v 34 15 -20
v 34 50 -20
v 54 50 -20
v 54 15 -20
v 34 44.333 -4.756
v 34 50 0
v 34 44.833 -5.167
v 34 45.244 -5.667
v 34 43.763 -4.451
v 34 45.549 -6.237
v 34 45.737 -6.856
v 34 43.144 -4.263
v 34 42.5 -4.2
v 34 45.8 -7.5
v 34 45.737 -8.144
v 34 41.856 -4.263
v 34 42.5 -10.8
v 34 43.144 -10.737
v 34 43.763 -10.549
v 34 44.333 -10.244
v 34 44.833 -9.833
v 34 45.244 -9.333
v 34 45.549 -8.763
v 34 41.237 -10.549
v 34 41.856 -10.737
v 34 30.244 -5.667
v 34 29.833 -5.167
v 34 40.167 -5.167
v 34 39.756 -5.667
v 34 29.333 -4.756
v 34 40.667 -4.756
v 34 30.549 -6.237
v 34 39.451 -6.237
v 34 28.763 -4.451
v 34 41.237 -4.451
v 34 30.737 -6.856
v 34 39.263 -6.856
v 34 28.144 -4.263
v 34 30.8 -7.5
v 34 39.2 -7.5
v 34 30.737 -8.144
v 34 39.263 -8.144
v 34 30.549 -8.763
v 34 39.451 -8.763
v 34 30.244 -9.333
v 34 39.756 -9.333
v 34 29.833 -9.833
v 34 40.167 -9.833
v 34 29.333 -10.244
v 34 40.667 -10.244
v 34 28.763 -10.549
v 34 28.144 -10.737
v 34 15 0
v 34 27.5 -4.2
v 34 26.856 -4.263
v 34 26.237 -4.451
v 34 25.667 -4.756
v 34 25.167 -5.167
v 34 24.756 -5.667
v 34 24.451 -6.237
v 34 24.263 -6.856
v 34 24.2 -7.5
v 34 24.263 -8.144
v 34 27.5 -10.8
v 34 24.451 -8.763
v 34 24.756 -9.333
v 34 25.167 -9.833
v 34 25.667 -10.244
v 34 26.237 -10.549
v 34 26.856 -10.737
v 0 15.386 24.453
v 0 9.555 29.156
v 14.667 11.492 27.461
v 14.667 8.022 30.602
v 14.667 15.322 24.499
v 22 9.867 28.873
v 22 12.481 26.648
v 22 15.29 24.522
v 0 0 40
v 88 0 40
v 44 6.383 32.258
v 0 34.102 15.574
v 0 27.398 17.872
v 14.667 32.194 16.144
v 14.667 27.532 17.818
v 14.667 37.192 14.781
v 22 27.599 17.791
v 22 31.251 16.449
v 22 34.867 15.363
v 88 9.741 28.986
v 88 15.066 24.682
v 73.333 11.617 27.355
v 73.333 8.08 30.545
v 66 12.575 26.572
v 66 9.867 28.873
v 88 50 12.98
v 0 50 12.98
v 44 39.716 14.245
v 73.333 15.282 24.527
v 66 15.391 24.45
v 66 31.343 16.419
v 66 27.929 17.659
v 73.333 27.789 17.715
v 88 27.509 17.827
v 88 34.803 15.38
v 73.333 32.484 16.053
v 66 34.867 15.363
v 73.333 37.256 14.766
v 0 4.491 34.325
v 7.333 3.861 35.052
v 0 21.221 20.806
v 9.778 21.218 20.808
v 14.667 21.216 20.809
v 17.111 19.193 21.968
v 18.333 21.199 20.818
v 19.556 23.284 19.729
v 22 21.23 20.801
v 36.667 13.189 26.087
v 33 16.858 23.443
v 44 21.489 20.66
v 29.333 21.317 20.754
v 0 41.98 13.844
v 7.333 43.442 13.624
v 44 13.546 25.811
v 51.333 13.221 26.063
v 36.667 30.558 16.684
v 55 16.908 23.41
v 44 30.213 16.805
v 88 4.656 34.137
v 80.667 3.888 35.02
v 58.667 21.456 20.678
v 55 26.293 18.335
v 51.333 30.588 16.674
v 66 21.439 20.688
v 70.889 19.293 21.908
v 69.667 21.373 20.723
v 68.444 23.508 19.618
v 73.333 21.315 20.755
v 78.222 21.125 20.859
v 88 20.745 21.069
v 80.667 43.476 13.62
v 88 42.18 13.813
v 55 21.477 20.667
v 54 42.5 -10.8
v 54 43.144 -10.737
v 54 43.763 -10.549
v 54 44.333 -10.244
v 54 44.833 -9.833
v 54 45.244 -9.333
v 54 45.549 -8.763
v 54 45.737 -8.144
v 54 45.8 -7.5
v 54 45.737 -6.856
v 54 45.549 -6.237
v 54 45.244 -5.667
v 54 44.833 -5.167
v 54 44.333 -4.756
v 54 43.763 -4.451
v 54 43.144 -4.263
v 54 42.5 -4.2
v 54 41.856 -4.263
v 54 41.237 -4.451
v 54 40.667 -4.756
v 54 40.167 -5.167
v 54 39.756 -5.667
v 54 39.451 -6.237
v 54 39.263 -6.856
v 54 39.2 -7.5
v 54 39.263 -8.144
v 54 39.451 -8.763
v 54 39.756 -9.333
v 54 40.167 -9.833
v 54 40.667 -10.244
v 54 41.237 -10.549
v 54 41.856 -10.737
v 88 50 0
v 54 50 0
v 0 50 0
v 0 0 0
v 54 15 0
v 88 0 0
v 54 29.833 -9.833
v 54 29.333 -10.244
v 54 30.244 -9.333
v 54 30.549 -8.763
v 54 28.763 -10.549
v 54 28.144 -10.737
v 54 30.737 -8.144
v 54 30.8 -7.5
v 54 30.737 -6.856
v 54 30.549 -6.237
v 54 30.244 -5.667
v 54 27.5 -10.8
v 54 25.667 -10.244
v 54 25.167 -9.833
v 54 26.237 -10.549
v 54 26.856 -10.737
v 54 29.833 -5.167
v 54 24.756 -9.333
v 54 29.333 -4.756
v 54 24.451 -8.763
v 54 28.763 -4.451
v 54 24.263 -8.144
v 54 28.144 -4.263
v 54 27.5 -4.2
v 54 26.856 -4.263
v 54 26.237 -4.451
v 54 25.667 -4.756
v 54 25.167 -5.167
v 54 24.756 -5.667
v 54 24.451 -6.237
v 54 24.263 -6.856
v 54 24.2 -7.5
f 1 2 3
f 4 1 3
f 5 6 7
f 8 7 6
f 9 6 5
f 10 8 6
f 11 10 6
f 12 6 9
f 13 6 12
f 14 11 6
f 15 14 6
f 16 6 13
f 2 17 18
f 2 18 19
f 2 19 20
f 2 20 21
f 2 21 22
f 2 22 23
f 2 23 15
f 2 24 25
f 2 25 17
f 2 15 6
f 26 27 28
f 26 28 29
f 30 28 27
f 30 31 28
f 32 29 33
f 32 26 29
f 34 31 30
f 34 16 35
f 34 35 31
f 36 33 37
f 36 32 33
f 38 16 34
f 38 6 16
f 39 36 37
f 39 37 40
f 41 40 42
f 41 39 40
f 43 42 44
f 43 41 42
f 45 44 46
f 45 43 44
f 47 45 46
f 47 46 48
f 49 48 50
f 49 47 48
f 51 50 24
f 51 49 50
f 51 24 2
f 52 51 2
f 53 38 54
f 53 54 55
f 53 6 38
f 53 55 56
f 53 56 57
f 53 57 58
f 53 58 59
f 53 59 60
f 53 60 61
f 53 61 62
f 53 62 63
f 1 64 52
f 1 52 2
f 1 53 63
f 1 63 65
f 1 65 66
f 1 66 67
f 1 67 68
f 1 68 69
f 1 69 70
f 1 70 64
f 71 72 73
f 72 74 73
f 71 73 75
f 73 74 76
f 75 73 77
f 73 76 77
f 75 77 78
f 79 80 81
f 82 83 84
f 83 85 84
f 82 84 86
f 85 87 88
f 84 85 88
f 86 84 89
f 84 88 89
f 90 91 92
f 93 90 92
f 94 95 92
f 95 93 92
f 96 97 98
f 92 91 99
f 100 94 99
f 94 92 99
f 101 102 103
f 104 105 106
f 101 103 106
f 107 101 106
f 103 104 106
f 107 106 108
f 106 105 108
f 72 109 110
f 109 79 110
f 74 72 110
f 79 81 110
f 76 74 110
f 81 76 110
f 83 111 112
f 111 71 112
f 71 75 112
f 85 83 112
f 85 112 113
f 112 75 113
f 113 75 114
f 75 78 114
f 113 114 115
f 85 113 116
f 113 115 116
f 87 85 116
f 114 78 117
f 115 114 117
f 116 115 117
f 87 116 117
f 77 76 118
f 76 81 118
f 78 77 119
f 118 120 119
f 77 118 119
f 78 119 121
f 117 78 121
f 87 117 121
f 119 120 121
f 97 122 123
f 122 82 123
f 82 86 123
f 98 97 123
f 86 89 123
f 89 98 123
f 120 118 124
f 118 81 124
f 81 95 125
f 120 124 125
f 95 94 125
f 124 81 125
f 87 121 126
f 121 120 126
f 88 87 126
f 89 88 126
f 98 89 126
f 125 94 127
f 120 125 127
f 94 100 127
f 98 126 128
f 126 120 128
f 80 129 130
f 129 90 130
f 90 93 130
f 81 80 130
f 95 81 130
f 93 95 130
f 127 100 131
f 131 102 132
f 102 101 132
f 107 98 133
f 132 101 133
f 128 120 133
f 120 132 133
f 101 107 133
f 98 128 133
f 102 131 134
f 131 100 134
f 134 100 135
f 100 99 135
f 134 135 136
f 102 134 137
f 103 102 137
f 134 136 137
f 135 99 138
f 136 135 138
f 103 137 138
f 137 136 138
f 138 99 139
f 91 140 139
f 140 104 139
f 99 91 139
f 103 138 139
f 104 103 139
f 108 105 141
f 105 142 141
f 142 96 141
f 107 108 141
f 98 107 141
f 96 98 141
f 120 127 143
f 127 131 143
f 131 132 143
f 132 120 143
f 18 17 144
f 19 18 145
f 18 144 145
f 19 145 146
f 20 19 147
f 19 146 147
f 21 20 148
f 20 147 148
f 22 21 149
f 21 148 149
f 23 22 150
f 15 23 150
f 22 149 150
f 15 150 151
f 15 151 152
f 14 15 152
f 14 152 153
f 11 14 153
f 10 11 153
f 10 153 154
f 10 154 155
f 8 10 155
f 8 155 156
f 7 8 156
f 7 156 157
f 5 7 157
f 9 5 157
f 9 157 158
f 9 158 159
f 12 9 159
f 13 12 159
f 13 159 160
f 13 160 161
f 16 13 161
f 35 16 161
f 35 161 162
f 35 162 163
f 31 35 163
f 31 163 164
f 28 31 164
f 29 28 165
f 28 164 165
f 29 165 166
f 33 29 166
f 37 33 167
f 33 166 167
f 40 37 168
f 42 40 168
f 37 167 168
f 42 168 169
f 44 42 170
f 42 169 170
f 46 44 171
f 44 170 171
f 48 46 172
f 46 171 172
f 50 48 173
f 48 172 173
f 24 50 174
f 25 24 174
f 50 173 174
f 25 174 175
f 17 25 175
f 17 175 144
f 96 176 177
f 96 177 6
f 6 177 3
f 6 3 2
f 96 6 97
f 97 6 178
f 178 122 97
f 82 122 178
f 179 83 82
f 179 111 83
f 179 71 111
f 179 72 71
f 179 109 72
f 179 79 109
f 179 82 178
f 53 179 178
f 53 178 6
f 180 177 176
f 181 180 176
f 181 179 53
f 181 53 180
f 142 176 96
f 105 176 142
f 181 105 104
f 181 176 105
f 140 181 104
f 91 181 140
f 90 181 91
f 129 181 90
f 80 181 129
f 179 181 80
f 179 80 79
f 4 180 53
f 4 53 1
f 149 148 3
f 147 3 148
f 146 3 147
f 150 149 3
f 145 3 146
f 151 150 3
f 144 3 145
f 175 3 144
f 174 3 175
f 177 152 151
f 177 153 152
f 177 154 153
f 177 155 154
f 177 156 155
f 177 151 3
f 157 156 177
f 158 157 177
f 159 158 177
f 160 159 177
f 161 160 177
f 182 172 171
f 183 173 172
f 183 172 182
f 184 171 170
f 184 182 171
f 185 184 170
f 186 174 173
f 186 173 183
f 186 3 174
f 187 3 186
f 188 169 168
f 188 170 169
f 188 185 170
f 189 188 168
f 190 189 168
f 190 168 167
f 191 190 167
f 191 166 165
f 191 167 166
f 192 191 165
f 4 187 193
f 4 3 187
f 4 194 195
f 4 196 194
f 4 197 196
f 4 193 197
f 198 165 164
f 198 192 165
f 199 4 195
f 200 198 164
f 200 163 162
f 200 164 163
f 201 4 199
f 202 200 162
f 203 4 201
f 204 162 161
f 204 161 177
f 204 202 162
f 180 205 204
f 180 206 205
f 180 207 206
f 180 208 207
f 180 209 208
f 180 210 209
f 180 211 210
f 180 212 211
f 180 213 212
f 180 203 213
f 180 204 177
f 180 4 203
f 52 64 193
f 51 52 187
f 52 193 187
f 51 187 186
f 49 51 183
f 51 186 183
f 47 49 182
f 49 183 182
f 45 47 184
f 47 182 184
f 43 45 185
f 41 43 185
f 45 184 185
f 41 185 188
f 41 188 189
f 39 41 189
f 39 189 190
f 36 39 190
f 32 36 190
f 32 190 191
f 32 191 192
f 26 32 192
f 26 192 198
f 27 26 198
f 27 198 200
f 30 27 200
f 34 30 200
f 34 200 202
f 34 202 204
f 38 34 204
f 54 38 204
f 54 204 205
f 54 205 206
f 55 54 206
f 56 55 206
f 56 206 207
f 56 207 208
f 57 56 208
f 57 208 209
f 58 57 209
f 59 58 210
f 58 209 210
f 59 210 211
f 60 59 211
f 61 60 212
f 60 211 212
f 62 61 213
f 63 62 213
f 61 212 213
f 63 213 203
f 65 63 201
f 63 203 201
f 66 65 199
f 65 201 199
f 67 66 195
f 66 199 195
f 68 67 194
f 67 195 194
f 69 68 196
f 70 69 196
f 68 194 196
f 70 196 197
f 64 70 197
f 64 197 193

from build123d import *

# Parameters (mm, degrees)
BOSS_EXTRUDE1_DEPTH = 50
SKETCH2_W           = 20
SKETCH2_H           = 15
CUT_EXTRUDE1_DEPTH  = 40
CUT_EXTRUDE2_DEPTH  = 134
CUT_EXTRUDE3_REACH  = 85.762
SKETCH5_R           = 3.3


with BuildPart() as part:
    # Sketch1 → Boss-Extrude1 (new body)
    with BuildSketch(Plane(origin=(0, 0, 0), x_dir=(1, 0, 0), z_dir=(0, 1, 0))):
        Polygon((0, 0), (34, 0), (34, 20), (54, 20), (54, 0), (88, 0), (88, -40), (0, -40), align=None)
    extrude(amount=BOSS_EXTRUDE1_DEPTH)

    # Sketch2 → Cut-Extrude1 (cut)
    with BuildSketch(Plane(origin=(54, 0, 0), x_dir=(0, 0, -1), z_dir=(1, 0, 0))):
        with Locations((10, 7.5)):
            Rectangle(SKETCH2_W, SKETCH2_H)
    extrude(amount=-CUT_EXTRUDE1_DEPTH, mode=Mode.SUBTRACT)

    # Sketch3 → Cut-Extrude2 (cut)
    with BuildSketch(Plane(origin=(88, 0, 0), x_dir=(0, 0, -1), z_dir=(1, 0, 0))):
        with BuildLine():
            Line((-40, 0), (-40, 50))
            Line((-40, 50), (-12.980453639, 50))
            add(Edge.make_bspline(
                [(-40, 0), (-14.830140994, 17.978651643), (-12.980453639, 50)],
                knots=[0, 0, 0, 1, 1, 1], degree=2))
        make_face()
    extrude(amount=-CUT_EXTRUDE2_DEPTH, mode=Mode.SUBTRACT)

    # Sketch5 → Cut-Extrude3 (cut, up to next)
    with BuildSketch(Plane(origin=(54, 0, 0), x_dir=(0, 0, -1), z_dir=(1, 0, 0)), mode=Mode.PRIVATE) as cut_extrude3_sk1:
        with Locations((7.5, 42.5)):
            Circle(SKETCH5_R)
    cut_extrude3_tool1 = extrude(cut_extrude3_sk1.sketch, amount=-CUT_EXTRUDE3_REACH, mode=Mode.PRIVATE) & part.part
    # Sketch5 → Cut-Extrude3 (cut, up to next)
    with BuildSketch(Plane(origin=(54, 0, 0), x_dir=(0, 0, -1), z_dir=(1, 0, 0)), mode=Mode.PRIVATE) as cut_extrude3_sk2:
        with Locations((7.5, 27.5)):
            Circle(SKETCH5_R)
    cut_extrude3_tool2 = extrude(cut_extrude3_sk2.sketch, amount=-CUT_EXTRUDE3_REACH, mode=Mode.PRIVATE) & part.part
    add(cut_extrude3_tool1.solids().sort_by_distance((54, 42.5, -7.5))[0], mode=Mode.SUBTRACT)
    add(cut_extrude3_tool2.solids().sort_by_distance((54, 27.5, -7.5))[0], mode=Mode.SUBTRACT)


solid = part.part
